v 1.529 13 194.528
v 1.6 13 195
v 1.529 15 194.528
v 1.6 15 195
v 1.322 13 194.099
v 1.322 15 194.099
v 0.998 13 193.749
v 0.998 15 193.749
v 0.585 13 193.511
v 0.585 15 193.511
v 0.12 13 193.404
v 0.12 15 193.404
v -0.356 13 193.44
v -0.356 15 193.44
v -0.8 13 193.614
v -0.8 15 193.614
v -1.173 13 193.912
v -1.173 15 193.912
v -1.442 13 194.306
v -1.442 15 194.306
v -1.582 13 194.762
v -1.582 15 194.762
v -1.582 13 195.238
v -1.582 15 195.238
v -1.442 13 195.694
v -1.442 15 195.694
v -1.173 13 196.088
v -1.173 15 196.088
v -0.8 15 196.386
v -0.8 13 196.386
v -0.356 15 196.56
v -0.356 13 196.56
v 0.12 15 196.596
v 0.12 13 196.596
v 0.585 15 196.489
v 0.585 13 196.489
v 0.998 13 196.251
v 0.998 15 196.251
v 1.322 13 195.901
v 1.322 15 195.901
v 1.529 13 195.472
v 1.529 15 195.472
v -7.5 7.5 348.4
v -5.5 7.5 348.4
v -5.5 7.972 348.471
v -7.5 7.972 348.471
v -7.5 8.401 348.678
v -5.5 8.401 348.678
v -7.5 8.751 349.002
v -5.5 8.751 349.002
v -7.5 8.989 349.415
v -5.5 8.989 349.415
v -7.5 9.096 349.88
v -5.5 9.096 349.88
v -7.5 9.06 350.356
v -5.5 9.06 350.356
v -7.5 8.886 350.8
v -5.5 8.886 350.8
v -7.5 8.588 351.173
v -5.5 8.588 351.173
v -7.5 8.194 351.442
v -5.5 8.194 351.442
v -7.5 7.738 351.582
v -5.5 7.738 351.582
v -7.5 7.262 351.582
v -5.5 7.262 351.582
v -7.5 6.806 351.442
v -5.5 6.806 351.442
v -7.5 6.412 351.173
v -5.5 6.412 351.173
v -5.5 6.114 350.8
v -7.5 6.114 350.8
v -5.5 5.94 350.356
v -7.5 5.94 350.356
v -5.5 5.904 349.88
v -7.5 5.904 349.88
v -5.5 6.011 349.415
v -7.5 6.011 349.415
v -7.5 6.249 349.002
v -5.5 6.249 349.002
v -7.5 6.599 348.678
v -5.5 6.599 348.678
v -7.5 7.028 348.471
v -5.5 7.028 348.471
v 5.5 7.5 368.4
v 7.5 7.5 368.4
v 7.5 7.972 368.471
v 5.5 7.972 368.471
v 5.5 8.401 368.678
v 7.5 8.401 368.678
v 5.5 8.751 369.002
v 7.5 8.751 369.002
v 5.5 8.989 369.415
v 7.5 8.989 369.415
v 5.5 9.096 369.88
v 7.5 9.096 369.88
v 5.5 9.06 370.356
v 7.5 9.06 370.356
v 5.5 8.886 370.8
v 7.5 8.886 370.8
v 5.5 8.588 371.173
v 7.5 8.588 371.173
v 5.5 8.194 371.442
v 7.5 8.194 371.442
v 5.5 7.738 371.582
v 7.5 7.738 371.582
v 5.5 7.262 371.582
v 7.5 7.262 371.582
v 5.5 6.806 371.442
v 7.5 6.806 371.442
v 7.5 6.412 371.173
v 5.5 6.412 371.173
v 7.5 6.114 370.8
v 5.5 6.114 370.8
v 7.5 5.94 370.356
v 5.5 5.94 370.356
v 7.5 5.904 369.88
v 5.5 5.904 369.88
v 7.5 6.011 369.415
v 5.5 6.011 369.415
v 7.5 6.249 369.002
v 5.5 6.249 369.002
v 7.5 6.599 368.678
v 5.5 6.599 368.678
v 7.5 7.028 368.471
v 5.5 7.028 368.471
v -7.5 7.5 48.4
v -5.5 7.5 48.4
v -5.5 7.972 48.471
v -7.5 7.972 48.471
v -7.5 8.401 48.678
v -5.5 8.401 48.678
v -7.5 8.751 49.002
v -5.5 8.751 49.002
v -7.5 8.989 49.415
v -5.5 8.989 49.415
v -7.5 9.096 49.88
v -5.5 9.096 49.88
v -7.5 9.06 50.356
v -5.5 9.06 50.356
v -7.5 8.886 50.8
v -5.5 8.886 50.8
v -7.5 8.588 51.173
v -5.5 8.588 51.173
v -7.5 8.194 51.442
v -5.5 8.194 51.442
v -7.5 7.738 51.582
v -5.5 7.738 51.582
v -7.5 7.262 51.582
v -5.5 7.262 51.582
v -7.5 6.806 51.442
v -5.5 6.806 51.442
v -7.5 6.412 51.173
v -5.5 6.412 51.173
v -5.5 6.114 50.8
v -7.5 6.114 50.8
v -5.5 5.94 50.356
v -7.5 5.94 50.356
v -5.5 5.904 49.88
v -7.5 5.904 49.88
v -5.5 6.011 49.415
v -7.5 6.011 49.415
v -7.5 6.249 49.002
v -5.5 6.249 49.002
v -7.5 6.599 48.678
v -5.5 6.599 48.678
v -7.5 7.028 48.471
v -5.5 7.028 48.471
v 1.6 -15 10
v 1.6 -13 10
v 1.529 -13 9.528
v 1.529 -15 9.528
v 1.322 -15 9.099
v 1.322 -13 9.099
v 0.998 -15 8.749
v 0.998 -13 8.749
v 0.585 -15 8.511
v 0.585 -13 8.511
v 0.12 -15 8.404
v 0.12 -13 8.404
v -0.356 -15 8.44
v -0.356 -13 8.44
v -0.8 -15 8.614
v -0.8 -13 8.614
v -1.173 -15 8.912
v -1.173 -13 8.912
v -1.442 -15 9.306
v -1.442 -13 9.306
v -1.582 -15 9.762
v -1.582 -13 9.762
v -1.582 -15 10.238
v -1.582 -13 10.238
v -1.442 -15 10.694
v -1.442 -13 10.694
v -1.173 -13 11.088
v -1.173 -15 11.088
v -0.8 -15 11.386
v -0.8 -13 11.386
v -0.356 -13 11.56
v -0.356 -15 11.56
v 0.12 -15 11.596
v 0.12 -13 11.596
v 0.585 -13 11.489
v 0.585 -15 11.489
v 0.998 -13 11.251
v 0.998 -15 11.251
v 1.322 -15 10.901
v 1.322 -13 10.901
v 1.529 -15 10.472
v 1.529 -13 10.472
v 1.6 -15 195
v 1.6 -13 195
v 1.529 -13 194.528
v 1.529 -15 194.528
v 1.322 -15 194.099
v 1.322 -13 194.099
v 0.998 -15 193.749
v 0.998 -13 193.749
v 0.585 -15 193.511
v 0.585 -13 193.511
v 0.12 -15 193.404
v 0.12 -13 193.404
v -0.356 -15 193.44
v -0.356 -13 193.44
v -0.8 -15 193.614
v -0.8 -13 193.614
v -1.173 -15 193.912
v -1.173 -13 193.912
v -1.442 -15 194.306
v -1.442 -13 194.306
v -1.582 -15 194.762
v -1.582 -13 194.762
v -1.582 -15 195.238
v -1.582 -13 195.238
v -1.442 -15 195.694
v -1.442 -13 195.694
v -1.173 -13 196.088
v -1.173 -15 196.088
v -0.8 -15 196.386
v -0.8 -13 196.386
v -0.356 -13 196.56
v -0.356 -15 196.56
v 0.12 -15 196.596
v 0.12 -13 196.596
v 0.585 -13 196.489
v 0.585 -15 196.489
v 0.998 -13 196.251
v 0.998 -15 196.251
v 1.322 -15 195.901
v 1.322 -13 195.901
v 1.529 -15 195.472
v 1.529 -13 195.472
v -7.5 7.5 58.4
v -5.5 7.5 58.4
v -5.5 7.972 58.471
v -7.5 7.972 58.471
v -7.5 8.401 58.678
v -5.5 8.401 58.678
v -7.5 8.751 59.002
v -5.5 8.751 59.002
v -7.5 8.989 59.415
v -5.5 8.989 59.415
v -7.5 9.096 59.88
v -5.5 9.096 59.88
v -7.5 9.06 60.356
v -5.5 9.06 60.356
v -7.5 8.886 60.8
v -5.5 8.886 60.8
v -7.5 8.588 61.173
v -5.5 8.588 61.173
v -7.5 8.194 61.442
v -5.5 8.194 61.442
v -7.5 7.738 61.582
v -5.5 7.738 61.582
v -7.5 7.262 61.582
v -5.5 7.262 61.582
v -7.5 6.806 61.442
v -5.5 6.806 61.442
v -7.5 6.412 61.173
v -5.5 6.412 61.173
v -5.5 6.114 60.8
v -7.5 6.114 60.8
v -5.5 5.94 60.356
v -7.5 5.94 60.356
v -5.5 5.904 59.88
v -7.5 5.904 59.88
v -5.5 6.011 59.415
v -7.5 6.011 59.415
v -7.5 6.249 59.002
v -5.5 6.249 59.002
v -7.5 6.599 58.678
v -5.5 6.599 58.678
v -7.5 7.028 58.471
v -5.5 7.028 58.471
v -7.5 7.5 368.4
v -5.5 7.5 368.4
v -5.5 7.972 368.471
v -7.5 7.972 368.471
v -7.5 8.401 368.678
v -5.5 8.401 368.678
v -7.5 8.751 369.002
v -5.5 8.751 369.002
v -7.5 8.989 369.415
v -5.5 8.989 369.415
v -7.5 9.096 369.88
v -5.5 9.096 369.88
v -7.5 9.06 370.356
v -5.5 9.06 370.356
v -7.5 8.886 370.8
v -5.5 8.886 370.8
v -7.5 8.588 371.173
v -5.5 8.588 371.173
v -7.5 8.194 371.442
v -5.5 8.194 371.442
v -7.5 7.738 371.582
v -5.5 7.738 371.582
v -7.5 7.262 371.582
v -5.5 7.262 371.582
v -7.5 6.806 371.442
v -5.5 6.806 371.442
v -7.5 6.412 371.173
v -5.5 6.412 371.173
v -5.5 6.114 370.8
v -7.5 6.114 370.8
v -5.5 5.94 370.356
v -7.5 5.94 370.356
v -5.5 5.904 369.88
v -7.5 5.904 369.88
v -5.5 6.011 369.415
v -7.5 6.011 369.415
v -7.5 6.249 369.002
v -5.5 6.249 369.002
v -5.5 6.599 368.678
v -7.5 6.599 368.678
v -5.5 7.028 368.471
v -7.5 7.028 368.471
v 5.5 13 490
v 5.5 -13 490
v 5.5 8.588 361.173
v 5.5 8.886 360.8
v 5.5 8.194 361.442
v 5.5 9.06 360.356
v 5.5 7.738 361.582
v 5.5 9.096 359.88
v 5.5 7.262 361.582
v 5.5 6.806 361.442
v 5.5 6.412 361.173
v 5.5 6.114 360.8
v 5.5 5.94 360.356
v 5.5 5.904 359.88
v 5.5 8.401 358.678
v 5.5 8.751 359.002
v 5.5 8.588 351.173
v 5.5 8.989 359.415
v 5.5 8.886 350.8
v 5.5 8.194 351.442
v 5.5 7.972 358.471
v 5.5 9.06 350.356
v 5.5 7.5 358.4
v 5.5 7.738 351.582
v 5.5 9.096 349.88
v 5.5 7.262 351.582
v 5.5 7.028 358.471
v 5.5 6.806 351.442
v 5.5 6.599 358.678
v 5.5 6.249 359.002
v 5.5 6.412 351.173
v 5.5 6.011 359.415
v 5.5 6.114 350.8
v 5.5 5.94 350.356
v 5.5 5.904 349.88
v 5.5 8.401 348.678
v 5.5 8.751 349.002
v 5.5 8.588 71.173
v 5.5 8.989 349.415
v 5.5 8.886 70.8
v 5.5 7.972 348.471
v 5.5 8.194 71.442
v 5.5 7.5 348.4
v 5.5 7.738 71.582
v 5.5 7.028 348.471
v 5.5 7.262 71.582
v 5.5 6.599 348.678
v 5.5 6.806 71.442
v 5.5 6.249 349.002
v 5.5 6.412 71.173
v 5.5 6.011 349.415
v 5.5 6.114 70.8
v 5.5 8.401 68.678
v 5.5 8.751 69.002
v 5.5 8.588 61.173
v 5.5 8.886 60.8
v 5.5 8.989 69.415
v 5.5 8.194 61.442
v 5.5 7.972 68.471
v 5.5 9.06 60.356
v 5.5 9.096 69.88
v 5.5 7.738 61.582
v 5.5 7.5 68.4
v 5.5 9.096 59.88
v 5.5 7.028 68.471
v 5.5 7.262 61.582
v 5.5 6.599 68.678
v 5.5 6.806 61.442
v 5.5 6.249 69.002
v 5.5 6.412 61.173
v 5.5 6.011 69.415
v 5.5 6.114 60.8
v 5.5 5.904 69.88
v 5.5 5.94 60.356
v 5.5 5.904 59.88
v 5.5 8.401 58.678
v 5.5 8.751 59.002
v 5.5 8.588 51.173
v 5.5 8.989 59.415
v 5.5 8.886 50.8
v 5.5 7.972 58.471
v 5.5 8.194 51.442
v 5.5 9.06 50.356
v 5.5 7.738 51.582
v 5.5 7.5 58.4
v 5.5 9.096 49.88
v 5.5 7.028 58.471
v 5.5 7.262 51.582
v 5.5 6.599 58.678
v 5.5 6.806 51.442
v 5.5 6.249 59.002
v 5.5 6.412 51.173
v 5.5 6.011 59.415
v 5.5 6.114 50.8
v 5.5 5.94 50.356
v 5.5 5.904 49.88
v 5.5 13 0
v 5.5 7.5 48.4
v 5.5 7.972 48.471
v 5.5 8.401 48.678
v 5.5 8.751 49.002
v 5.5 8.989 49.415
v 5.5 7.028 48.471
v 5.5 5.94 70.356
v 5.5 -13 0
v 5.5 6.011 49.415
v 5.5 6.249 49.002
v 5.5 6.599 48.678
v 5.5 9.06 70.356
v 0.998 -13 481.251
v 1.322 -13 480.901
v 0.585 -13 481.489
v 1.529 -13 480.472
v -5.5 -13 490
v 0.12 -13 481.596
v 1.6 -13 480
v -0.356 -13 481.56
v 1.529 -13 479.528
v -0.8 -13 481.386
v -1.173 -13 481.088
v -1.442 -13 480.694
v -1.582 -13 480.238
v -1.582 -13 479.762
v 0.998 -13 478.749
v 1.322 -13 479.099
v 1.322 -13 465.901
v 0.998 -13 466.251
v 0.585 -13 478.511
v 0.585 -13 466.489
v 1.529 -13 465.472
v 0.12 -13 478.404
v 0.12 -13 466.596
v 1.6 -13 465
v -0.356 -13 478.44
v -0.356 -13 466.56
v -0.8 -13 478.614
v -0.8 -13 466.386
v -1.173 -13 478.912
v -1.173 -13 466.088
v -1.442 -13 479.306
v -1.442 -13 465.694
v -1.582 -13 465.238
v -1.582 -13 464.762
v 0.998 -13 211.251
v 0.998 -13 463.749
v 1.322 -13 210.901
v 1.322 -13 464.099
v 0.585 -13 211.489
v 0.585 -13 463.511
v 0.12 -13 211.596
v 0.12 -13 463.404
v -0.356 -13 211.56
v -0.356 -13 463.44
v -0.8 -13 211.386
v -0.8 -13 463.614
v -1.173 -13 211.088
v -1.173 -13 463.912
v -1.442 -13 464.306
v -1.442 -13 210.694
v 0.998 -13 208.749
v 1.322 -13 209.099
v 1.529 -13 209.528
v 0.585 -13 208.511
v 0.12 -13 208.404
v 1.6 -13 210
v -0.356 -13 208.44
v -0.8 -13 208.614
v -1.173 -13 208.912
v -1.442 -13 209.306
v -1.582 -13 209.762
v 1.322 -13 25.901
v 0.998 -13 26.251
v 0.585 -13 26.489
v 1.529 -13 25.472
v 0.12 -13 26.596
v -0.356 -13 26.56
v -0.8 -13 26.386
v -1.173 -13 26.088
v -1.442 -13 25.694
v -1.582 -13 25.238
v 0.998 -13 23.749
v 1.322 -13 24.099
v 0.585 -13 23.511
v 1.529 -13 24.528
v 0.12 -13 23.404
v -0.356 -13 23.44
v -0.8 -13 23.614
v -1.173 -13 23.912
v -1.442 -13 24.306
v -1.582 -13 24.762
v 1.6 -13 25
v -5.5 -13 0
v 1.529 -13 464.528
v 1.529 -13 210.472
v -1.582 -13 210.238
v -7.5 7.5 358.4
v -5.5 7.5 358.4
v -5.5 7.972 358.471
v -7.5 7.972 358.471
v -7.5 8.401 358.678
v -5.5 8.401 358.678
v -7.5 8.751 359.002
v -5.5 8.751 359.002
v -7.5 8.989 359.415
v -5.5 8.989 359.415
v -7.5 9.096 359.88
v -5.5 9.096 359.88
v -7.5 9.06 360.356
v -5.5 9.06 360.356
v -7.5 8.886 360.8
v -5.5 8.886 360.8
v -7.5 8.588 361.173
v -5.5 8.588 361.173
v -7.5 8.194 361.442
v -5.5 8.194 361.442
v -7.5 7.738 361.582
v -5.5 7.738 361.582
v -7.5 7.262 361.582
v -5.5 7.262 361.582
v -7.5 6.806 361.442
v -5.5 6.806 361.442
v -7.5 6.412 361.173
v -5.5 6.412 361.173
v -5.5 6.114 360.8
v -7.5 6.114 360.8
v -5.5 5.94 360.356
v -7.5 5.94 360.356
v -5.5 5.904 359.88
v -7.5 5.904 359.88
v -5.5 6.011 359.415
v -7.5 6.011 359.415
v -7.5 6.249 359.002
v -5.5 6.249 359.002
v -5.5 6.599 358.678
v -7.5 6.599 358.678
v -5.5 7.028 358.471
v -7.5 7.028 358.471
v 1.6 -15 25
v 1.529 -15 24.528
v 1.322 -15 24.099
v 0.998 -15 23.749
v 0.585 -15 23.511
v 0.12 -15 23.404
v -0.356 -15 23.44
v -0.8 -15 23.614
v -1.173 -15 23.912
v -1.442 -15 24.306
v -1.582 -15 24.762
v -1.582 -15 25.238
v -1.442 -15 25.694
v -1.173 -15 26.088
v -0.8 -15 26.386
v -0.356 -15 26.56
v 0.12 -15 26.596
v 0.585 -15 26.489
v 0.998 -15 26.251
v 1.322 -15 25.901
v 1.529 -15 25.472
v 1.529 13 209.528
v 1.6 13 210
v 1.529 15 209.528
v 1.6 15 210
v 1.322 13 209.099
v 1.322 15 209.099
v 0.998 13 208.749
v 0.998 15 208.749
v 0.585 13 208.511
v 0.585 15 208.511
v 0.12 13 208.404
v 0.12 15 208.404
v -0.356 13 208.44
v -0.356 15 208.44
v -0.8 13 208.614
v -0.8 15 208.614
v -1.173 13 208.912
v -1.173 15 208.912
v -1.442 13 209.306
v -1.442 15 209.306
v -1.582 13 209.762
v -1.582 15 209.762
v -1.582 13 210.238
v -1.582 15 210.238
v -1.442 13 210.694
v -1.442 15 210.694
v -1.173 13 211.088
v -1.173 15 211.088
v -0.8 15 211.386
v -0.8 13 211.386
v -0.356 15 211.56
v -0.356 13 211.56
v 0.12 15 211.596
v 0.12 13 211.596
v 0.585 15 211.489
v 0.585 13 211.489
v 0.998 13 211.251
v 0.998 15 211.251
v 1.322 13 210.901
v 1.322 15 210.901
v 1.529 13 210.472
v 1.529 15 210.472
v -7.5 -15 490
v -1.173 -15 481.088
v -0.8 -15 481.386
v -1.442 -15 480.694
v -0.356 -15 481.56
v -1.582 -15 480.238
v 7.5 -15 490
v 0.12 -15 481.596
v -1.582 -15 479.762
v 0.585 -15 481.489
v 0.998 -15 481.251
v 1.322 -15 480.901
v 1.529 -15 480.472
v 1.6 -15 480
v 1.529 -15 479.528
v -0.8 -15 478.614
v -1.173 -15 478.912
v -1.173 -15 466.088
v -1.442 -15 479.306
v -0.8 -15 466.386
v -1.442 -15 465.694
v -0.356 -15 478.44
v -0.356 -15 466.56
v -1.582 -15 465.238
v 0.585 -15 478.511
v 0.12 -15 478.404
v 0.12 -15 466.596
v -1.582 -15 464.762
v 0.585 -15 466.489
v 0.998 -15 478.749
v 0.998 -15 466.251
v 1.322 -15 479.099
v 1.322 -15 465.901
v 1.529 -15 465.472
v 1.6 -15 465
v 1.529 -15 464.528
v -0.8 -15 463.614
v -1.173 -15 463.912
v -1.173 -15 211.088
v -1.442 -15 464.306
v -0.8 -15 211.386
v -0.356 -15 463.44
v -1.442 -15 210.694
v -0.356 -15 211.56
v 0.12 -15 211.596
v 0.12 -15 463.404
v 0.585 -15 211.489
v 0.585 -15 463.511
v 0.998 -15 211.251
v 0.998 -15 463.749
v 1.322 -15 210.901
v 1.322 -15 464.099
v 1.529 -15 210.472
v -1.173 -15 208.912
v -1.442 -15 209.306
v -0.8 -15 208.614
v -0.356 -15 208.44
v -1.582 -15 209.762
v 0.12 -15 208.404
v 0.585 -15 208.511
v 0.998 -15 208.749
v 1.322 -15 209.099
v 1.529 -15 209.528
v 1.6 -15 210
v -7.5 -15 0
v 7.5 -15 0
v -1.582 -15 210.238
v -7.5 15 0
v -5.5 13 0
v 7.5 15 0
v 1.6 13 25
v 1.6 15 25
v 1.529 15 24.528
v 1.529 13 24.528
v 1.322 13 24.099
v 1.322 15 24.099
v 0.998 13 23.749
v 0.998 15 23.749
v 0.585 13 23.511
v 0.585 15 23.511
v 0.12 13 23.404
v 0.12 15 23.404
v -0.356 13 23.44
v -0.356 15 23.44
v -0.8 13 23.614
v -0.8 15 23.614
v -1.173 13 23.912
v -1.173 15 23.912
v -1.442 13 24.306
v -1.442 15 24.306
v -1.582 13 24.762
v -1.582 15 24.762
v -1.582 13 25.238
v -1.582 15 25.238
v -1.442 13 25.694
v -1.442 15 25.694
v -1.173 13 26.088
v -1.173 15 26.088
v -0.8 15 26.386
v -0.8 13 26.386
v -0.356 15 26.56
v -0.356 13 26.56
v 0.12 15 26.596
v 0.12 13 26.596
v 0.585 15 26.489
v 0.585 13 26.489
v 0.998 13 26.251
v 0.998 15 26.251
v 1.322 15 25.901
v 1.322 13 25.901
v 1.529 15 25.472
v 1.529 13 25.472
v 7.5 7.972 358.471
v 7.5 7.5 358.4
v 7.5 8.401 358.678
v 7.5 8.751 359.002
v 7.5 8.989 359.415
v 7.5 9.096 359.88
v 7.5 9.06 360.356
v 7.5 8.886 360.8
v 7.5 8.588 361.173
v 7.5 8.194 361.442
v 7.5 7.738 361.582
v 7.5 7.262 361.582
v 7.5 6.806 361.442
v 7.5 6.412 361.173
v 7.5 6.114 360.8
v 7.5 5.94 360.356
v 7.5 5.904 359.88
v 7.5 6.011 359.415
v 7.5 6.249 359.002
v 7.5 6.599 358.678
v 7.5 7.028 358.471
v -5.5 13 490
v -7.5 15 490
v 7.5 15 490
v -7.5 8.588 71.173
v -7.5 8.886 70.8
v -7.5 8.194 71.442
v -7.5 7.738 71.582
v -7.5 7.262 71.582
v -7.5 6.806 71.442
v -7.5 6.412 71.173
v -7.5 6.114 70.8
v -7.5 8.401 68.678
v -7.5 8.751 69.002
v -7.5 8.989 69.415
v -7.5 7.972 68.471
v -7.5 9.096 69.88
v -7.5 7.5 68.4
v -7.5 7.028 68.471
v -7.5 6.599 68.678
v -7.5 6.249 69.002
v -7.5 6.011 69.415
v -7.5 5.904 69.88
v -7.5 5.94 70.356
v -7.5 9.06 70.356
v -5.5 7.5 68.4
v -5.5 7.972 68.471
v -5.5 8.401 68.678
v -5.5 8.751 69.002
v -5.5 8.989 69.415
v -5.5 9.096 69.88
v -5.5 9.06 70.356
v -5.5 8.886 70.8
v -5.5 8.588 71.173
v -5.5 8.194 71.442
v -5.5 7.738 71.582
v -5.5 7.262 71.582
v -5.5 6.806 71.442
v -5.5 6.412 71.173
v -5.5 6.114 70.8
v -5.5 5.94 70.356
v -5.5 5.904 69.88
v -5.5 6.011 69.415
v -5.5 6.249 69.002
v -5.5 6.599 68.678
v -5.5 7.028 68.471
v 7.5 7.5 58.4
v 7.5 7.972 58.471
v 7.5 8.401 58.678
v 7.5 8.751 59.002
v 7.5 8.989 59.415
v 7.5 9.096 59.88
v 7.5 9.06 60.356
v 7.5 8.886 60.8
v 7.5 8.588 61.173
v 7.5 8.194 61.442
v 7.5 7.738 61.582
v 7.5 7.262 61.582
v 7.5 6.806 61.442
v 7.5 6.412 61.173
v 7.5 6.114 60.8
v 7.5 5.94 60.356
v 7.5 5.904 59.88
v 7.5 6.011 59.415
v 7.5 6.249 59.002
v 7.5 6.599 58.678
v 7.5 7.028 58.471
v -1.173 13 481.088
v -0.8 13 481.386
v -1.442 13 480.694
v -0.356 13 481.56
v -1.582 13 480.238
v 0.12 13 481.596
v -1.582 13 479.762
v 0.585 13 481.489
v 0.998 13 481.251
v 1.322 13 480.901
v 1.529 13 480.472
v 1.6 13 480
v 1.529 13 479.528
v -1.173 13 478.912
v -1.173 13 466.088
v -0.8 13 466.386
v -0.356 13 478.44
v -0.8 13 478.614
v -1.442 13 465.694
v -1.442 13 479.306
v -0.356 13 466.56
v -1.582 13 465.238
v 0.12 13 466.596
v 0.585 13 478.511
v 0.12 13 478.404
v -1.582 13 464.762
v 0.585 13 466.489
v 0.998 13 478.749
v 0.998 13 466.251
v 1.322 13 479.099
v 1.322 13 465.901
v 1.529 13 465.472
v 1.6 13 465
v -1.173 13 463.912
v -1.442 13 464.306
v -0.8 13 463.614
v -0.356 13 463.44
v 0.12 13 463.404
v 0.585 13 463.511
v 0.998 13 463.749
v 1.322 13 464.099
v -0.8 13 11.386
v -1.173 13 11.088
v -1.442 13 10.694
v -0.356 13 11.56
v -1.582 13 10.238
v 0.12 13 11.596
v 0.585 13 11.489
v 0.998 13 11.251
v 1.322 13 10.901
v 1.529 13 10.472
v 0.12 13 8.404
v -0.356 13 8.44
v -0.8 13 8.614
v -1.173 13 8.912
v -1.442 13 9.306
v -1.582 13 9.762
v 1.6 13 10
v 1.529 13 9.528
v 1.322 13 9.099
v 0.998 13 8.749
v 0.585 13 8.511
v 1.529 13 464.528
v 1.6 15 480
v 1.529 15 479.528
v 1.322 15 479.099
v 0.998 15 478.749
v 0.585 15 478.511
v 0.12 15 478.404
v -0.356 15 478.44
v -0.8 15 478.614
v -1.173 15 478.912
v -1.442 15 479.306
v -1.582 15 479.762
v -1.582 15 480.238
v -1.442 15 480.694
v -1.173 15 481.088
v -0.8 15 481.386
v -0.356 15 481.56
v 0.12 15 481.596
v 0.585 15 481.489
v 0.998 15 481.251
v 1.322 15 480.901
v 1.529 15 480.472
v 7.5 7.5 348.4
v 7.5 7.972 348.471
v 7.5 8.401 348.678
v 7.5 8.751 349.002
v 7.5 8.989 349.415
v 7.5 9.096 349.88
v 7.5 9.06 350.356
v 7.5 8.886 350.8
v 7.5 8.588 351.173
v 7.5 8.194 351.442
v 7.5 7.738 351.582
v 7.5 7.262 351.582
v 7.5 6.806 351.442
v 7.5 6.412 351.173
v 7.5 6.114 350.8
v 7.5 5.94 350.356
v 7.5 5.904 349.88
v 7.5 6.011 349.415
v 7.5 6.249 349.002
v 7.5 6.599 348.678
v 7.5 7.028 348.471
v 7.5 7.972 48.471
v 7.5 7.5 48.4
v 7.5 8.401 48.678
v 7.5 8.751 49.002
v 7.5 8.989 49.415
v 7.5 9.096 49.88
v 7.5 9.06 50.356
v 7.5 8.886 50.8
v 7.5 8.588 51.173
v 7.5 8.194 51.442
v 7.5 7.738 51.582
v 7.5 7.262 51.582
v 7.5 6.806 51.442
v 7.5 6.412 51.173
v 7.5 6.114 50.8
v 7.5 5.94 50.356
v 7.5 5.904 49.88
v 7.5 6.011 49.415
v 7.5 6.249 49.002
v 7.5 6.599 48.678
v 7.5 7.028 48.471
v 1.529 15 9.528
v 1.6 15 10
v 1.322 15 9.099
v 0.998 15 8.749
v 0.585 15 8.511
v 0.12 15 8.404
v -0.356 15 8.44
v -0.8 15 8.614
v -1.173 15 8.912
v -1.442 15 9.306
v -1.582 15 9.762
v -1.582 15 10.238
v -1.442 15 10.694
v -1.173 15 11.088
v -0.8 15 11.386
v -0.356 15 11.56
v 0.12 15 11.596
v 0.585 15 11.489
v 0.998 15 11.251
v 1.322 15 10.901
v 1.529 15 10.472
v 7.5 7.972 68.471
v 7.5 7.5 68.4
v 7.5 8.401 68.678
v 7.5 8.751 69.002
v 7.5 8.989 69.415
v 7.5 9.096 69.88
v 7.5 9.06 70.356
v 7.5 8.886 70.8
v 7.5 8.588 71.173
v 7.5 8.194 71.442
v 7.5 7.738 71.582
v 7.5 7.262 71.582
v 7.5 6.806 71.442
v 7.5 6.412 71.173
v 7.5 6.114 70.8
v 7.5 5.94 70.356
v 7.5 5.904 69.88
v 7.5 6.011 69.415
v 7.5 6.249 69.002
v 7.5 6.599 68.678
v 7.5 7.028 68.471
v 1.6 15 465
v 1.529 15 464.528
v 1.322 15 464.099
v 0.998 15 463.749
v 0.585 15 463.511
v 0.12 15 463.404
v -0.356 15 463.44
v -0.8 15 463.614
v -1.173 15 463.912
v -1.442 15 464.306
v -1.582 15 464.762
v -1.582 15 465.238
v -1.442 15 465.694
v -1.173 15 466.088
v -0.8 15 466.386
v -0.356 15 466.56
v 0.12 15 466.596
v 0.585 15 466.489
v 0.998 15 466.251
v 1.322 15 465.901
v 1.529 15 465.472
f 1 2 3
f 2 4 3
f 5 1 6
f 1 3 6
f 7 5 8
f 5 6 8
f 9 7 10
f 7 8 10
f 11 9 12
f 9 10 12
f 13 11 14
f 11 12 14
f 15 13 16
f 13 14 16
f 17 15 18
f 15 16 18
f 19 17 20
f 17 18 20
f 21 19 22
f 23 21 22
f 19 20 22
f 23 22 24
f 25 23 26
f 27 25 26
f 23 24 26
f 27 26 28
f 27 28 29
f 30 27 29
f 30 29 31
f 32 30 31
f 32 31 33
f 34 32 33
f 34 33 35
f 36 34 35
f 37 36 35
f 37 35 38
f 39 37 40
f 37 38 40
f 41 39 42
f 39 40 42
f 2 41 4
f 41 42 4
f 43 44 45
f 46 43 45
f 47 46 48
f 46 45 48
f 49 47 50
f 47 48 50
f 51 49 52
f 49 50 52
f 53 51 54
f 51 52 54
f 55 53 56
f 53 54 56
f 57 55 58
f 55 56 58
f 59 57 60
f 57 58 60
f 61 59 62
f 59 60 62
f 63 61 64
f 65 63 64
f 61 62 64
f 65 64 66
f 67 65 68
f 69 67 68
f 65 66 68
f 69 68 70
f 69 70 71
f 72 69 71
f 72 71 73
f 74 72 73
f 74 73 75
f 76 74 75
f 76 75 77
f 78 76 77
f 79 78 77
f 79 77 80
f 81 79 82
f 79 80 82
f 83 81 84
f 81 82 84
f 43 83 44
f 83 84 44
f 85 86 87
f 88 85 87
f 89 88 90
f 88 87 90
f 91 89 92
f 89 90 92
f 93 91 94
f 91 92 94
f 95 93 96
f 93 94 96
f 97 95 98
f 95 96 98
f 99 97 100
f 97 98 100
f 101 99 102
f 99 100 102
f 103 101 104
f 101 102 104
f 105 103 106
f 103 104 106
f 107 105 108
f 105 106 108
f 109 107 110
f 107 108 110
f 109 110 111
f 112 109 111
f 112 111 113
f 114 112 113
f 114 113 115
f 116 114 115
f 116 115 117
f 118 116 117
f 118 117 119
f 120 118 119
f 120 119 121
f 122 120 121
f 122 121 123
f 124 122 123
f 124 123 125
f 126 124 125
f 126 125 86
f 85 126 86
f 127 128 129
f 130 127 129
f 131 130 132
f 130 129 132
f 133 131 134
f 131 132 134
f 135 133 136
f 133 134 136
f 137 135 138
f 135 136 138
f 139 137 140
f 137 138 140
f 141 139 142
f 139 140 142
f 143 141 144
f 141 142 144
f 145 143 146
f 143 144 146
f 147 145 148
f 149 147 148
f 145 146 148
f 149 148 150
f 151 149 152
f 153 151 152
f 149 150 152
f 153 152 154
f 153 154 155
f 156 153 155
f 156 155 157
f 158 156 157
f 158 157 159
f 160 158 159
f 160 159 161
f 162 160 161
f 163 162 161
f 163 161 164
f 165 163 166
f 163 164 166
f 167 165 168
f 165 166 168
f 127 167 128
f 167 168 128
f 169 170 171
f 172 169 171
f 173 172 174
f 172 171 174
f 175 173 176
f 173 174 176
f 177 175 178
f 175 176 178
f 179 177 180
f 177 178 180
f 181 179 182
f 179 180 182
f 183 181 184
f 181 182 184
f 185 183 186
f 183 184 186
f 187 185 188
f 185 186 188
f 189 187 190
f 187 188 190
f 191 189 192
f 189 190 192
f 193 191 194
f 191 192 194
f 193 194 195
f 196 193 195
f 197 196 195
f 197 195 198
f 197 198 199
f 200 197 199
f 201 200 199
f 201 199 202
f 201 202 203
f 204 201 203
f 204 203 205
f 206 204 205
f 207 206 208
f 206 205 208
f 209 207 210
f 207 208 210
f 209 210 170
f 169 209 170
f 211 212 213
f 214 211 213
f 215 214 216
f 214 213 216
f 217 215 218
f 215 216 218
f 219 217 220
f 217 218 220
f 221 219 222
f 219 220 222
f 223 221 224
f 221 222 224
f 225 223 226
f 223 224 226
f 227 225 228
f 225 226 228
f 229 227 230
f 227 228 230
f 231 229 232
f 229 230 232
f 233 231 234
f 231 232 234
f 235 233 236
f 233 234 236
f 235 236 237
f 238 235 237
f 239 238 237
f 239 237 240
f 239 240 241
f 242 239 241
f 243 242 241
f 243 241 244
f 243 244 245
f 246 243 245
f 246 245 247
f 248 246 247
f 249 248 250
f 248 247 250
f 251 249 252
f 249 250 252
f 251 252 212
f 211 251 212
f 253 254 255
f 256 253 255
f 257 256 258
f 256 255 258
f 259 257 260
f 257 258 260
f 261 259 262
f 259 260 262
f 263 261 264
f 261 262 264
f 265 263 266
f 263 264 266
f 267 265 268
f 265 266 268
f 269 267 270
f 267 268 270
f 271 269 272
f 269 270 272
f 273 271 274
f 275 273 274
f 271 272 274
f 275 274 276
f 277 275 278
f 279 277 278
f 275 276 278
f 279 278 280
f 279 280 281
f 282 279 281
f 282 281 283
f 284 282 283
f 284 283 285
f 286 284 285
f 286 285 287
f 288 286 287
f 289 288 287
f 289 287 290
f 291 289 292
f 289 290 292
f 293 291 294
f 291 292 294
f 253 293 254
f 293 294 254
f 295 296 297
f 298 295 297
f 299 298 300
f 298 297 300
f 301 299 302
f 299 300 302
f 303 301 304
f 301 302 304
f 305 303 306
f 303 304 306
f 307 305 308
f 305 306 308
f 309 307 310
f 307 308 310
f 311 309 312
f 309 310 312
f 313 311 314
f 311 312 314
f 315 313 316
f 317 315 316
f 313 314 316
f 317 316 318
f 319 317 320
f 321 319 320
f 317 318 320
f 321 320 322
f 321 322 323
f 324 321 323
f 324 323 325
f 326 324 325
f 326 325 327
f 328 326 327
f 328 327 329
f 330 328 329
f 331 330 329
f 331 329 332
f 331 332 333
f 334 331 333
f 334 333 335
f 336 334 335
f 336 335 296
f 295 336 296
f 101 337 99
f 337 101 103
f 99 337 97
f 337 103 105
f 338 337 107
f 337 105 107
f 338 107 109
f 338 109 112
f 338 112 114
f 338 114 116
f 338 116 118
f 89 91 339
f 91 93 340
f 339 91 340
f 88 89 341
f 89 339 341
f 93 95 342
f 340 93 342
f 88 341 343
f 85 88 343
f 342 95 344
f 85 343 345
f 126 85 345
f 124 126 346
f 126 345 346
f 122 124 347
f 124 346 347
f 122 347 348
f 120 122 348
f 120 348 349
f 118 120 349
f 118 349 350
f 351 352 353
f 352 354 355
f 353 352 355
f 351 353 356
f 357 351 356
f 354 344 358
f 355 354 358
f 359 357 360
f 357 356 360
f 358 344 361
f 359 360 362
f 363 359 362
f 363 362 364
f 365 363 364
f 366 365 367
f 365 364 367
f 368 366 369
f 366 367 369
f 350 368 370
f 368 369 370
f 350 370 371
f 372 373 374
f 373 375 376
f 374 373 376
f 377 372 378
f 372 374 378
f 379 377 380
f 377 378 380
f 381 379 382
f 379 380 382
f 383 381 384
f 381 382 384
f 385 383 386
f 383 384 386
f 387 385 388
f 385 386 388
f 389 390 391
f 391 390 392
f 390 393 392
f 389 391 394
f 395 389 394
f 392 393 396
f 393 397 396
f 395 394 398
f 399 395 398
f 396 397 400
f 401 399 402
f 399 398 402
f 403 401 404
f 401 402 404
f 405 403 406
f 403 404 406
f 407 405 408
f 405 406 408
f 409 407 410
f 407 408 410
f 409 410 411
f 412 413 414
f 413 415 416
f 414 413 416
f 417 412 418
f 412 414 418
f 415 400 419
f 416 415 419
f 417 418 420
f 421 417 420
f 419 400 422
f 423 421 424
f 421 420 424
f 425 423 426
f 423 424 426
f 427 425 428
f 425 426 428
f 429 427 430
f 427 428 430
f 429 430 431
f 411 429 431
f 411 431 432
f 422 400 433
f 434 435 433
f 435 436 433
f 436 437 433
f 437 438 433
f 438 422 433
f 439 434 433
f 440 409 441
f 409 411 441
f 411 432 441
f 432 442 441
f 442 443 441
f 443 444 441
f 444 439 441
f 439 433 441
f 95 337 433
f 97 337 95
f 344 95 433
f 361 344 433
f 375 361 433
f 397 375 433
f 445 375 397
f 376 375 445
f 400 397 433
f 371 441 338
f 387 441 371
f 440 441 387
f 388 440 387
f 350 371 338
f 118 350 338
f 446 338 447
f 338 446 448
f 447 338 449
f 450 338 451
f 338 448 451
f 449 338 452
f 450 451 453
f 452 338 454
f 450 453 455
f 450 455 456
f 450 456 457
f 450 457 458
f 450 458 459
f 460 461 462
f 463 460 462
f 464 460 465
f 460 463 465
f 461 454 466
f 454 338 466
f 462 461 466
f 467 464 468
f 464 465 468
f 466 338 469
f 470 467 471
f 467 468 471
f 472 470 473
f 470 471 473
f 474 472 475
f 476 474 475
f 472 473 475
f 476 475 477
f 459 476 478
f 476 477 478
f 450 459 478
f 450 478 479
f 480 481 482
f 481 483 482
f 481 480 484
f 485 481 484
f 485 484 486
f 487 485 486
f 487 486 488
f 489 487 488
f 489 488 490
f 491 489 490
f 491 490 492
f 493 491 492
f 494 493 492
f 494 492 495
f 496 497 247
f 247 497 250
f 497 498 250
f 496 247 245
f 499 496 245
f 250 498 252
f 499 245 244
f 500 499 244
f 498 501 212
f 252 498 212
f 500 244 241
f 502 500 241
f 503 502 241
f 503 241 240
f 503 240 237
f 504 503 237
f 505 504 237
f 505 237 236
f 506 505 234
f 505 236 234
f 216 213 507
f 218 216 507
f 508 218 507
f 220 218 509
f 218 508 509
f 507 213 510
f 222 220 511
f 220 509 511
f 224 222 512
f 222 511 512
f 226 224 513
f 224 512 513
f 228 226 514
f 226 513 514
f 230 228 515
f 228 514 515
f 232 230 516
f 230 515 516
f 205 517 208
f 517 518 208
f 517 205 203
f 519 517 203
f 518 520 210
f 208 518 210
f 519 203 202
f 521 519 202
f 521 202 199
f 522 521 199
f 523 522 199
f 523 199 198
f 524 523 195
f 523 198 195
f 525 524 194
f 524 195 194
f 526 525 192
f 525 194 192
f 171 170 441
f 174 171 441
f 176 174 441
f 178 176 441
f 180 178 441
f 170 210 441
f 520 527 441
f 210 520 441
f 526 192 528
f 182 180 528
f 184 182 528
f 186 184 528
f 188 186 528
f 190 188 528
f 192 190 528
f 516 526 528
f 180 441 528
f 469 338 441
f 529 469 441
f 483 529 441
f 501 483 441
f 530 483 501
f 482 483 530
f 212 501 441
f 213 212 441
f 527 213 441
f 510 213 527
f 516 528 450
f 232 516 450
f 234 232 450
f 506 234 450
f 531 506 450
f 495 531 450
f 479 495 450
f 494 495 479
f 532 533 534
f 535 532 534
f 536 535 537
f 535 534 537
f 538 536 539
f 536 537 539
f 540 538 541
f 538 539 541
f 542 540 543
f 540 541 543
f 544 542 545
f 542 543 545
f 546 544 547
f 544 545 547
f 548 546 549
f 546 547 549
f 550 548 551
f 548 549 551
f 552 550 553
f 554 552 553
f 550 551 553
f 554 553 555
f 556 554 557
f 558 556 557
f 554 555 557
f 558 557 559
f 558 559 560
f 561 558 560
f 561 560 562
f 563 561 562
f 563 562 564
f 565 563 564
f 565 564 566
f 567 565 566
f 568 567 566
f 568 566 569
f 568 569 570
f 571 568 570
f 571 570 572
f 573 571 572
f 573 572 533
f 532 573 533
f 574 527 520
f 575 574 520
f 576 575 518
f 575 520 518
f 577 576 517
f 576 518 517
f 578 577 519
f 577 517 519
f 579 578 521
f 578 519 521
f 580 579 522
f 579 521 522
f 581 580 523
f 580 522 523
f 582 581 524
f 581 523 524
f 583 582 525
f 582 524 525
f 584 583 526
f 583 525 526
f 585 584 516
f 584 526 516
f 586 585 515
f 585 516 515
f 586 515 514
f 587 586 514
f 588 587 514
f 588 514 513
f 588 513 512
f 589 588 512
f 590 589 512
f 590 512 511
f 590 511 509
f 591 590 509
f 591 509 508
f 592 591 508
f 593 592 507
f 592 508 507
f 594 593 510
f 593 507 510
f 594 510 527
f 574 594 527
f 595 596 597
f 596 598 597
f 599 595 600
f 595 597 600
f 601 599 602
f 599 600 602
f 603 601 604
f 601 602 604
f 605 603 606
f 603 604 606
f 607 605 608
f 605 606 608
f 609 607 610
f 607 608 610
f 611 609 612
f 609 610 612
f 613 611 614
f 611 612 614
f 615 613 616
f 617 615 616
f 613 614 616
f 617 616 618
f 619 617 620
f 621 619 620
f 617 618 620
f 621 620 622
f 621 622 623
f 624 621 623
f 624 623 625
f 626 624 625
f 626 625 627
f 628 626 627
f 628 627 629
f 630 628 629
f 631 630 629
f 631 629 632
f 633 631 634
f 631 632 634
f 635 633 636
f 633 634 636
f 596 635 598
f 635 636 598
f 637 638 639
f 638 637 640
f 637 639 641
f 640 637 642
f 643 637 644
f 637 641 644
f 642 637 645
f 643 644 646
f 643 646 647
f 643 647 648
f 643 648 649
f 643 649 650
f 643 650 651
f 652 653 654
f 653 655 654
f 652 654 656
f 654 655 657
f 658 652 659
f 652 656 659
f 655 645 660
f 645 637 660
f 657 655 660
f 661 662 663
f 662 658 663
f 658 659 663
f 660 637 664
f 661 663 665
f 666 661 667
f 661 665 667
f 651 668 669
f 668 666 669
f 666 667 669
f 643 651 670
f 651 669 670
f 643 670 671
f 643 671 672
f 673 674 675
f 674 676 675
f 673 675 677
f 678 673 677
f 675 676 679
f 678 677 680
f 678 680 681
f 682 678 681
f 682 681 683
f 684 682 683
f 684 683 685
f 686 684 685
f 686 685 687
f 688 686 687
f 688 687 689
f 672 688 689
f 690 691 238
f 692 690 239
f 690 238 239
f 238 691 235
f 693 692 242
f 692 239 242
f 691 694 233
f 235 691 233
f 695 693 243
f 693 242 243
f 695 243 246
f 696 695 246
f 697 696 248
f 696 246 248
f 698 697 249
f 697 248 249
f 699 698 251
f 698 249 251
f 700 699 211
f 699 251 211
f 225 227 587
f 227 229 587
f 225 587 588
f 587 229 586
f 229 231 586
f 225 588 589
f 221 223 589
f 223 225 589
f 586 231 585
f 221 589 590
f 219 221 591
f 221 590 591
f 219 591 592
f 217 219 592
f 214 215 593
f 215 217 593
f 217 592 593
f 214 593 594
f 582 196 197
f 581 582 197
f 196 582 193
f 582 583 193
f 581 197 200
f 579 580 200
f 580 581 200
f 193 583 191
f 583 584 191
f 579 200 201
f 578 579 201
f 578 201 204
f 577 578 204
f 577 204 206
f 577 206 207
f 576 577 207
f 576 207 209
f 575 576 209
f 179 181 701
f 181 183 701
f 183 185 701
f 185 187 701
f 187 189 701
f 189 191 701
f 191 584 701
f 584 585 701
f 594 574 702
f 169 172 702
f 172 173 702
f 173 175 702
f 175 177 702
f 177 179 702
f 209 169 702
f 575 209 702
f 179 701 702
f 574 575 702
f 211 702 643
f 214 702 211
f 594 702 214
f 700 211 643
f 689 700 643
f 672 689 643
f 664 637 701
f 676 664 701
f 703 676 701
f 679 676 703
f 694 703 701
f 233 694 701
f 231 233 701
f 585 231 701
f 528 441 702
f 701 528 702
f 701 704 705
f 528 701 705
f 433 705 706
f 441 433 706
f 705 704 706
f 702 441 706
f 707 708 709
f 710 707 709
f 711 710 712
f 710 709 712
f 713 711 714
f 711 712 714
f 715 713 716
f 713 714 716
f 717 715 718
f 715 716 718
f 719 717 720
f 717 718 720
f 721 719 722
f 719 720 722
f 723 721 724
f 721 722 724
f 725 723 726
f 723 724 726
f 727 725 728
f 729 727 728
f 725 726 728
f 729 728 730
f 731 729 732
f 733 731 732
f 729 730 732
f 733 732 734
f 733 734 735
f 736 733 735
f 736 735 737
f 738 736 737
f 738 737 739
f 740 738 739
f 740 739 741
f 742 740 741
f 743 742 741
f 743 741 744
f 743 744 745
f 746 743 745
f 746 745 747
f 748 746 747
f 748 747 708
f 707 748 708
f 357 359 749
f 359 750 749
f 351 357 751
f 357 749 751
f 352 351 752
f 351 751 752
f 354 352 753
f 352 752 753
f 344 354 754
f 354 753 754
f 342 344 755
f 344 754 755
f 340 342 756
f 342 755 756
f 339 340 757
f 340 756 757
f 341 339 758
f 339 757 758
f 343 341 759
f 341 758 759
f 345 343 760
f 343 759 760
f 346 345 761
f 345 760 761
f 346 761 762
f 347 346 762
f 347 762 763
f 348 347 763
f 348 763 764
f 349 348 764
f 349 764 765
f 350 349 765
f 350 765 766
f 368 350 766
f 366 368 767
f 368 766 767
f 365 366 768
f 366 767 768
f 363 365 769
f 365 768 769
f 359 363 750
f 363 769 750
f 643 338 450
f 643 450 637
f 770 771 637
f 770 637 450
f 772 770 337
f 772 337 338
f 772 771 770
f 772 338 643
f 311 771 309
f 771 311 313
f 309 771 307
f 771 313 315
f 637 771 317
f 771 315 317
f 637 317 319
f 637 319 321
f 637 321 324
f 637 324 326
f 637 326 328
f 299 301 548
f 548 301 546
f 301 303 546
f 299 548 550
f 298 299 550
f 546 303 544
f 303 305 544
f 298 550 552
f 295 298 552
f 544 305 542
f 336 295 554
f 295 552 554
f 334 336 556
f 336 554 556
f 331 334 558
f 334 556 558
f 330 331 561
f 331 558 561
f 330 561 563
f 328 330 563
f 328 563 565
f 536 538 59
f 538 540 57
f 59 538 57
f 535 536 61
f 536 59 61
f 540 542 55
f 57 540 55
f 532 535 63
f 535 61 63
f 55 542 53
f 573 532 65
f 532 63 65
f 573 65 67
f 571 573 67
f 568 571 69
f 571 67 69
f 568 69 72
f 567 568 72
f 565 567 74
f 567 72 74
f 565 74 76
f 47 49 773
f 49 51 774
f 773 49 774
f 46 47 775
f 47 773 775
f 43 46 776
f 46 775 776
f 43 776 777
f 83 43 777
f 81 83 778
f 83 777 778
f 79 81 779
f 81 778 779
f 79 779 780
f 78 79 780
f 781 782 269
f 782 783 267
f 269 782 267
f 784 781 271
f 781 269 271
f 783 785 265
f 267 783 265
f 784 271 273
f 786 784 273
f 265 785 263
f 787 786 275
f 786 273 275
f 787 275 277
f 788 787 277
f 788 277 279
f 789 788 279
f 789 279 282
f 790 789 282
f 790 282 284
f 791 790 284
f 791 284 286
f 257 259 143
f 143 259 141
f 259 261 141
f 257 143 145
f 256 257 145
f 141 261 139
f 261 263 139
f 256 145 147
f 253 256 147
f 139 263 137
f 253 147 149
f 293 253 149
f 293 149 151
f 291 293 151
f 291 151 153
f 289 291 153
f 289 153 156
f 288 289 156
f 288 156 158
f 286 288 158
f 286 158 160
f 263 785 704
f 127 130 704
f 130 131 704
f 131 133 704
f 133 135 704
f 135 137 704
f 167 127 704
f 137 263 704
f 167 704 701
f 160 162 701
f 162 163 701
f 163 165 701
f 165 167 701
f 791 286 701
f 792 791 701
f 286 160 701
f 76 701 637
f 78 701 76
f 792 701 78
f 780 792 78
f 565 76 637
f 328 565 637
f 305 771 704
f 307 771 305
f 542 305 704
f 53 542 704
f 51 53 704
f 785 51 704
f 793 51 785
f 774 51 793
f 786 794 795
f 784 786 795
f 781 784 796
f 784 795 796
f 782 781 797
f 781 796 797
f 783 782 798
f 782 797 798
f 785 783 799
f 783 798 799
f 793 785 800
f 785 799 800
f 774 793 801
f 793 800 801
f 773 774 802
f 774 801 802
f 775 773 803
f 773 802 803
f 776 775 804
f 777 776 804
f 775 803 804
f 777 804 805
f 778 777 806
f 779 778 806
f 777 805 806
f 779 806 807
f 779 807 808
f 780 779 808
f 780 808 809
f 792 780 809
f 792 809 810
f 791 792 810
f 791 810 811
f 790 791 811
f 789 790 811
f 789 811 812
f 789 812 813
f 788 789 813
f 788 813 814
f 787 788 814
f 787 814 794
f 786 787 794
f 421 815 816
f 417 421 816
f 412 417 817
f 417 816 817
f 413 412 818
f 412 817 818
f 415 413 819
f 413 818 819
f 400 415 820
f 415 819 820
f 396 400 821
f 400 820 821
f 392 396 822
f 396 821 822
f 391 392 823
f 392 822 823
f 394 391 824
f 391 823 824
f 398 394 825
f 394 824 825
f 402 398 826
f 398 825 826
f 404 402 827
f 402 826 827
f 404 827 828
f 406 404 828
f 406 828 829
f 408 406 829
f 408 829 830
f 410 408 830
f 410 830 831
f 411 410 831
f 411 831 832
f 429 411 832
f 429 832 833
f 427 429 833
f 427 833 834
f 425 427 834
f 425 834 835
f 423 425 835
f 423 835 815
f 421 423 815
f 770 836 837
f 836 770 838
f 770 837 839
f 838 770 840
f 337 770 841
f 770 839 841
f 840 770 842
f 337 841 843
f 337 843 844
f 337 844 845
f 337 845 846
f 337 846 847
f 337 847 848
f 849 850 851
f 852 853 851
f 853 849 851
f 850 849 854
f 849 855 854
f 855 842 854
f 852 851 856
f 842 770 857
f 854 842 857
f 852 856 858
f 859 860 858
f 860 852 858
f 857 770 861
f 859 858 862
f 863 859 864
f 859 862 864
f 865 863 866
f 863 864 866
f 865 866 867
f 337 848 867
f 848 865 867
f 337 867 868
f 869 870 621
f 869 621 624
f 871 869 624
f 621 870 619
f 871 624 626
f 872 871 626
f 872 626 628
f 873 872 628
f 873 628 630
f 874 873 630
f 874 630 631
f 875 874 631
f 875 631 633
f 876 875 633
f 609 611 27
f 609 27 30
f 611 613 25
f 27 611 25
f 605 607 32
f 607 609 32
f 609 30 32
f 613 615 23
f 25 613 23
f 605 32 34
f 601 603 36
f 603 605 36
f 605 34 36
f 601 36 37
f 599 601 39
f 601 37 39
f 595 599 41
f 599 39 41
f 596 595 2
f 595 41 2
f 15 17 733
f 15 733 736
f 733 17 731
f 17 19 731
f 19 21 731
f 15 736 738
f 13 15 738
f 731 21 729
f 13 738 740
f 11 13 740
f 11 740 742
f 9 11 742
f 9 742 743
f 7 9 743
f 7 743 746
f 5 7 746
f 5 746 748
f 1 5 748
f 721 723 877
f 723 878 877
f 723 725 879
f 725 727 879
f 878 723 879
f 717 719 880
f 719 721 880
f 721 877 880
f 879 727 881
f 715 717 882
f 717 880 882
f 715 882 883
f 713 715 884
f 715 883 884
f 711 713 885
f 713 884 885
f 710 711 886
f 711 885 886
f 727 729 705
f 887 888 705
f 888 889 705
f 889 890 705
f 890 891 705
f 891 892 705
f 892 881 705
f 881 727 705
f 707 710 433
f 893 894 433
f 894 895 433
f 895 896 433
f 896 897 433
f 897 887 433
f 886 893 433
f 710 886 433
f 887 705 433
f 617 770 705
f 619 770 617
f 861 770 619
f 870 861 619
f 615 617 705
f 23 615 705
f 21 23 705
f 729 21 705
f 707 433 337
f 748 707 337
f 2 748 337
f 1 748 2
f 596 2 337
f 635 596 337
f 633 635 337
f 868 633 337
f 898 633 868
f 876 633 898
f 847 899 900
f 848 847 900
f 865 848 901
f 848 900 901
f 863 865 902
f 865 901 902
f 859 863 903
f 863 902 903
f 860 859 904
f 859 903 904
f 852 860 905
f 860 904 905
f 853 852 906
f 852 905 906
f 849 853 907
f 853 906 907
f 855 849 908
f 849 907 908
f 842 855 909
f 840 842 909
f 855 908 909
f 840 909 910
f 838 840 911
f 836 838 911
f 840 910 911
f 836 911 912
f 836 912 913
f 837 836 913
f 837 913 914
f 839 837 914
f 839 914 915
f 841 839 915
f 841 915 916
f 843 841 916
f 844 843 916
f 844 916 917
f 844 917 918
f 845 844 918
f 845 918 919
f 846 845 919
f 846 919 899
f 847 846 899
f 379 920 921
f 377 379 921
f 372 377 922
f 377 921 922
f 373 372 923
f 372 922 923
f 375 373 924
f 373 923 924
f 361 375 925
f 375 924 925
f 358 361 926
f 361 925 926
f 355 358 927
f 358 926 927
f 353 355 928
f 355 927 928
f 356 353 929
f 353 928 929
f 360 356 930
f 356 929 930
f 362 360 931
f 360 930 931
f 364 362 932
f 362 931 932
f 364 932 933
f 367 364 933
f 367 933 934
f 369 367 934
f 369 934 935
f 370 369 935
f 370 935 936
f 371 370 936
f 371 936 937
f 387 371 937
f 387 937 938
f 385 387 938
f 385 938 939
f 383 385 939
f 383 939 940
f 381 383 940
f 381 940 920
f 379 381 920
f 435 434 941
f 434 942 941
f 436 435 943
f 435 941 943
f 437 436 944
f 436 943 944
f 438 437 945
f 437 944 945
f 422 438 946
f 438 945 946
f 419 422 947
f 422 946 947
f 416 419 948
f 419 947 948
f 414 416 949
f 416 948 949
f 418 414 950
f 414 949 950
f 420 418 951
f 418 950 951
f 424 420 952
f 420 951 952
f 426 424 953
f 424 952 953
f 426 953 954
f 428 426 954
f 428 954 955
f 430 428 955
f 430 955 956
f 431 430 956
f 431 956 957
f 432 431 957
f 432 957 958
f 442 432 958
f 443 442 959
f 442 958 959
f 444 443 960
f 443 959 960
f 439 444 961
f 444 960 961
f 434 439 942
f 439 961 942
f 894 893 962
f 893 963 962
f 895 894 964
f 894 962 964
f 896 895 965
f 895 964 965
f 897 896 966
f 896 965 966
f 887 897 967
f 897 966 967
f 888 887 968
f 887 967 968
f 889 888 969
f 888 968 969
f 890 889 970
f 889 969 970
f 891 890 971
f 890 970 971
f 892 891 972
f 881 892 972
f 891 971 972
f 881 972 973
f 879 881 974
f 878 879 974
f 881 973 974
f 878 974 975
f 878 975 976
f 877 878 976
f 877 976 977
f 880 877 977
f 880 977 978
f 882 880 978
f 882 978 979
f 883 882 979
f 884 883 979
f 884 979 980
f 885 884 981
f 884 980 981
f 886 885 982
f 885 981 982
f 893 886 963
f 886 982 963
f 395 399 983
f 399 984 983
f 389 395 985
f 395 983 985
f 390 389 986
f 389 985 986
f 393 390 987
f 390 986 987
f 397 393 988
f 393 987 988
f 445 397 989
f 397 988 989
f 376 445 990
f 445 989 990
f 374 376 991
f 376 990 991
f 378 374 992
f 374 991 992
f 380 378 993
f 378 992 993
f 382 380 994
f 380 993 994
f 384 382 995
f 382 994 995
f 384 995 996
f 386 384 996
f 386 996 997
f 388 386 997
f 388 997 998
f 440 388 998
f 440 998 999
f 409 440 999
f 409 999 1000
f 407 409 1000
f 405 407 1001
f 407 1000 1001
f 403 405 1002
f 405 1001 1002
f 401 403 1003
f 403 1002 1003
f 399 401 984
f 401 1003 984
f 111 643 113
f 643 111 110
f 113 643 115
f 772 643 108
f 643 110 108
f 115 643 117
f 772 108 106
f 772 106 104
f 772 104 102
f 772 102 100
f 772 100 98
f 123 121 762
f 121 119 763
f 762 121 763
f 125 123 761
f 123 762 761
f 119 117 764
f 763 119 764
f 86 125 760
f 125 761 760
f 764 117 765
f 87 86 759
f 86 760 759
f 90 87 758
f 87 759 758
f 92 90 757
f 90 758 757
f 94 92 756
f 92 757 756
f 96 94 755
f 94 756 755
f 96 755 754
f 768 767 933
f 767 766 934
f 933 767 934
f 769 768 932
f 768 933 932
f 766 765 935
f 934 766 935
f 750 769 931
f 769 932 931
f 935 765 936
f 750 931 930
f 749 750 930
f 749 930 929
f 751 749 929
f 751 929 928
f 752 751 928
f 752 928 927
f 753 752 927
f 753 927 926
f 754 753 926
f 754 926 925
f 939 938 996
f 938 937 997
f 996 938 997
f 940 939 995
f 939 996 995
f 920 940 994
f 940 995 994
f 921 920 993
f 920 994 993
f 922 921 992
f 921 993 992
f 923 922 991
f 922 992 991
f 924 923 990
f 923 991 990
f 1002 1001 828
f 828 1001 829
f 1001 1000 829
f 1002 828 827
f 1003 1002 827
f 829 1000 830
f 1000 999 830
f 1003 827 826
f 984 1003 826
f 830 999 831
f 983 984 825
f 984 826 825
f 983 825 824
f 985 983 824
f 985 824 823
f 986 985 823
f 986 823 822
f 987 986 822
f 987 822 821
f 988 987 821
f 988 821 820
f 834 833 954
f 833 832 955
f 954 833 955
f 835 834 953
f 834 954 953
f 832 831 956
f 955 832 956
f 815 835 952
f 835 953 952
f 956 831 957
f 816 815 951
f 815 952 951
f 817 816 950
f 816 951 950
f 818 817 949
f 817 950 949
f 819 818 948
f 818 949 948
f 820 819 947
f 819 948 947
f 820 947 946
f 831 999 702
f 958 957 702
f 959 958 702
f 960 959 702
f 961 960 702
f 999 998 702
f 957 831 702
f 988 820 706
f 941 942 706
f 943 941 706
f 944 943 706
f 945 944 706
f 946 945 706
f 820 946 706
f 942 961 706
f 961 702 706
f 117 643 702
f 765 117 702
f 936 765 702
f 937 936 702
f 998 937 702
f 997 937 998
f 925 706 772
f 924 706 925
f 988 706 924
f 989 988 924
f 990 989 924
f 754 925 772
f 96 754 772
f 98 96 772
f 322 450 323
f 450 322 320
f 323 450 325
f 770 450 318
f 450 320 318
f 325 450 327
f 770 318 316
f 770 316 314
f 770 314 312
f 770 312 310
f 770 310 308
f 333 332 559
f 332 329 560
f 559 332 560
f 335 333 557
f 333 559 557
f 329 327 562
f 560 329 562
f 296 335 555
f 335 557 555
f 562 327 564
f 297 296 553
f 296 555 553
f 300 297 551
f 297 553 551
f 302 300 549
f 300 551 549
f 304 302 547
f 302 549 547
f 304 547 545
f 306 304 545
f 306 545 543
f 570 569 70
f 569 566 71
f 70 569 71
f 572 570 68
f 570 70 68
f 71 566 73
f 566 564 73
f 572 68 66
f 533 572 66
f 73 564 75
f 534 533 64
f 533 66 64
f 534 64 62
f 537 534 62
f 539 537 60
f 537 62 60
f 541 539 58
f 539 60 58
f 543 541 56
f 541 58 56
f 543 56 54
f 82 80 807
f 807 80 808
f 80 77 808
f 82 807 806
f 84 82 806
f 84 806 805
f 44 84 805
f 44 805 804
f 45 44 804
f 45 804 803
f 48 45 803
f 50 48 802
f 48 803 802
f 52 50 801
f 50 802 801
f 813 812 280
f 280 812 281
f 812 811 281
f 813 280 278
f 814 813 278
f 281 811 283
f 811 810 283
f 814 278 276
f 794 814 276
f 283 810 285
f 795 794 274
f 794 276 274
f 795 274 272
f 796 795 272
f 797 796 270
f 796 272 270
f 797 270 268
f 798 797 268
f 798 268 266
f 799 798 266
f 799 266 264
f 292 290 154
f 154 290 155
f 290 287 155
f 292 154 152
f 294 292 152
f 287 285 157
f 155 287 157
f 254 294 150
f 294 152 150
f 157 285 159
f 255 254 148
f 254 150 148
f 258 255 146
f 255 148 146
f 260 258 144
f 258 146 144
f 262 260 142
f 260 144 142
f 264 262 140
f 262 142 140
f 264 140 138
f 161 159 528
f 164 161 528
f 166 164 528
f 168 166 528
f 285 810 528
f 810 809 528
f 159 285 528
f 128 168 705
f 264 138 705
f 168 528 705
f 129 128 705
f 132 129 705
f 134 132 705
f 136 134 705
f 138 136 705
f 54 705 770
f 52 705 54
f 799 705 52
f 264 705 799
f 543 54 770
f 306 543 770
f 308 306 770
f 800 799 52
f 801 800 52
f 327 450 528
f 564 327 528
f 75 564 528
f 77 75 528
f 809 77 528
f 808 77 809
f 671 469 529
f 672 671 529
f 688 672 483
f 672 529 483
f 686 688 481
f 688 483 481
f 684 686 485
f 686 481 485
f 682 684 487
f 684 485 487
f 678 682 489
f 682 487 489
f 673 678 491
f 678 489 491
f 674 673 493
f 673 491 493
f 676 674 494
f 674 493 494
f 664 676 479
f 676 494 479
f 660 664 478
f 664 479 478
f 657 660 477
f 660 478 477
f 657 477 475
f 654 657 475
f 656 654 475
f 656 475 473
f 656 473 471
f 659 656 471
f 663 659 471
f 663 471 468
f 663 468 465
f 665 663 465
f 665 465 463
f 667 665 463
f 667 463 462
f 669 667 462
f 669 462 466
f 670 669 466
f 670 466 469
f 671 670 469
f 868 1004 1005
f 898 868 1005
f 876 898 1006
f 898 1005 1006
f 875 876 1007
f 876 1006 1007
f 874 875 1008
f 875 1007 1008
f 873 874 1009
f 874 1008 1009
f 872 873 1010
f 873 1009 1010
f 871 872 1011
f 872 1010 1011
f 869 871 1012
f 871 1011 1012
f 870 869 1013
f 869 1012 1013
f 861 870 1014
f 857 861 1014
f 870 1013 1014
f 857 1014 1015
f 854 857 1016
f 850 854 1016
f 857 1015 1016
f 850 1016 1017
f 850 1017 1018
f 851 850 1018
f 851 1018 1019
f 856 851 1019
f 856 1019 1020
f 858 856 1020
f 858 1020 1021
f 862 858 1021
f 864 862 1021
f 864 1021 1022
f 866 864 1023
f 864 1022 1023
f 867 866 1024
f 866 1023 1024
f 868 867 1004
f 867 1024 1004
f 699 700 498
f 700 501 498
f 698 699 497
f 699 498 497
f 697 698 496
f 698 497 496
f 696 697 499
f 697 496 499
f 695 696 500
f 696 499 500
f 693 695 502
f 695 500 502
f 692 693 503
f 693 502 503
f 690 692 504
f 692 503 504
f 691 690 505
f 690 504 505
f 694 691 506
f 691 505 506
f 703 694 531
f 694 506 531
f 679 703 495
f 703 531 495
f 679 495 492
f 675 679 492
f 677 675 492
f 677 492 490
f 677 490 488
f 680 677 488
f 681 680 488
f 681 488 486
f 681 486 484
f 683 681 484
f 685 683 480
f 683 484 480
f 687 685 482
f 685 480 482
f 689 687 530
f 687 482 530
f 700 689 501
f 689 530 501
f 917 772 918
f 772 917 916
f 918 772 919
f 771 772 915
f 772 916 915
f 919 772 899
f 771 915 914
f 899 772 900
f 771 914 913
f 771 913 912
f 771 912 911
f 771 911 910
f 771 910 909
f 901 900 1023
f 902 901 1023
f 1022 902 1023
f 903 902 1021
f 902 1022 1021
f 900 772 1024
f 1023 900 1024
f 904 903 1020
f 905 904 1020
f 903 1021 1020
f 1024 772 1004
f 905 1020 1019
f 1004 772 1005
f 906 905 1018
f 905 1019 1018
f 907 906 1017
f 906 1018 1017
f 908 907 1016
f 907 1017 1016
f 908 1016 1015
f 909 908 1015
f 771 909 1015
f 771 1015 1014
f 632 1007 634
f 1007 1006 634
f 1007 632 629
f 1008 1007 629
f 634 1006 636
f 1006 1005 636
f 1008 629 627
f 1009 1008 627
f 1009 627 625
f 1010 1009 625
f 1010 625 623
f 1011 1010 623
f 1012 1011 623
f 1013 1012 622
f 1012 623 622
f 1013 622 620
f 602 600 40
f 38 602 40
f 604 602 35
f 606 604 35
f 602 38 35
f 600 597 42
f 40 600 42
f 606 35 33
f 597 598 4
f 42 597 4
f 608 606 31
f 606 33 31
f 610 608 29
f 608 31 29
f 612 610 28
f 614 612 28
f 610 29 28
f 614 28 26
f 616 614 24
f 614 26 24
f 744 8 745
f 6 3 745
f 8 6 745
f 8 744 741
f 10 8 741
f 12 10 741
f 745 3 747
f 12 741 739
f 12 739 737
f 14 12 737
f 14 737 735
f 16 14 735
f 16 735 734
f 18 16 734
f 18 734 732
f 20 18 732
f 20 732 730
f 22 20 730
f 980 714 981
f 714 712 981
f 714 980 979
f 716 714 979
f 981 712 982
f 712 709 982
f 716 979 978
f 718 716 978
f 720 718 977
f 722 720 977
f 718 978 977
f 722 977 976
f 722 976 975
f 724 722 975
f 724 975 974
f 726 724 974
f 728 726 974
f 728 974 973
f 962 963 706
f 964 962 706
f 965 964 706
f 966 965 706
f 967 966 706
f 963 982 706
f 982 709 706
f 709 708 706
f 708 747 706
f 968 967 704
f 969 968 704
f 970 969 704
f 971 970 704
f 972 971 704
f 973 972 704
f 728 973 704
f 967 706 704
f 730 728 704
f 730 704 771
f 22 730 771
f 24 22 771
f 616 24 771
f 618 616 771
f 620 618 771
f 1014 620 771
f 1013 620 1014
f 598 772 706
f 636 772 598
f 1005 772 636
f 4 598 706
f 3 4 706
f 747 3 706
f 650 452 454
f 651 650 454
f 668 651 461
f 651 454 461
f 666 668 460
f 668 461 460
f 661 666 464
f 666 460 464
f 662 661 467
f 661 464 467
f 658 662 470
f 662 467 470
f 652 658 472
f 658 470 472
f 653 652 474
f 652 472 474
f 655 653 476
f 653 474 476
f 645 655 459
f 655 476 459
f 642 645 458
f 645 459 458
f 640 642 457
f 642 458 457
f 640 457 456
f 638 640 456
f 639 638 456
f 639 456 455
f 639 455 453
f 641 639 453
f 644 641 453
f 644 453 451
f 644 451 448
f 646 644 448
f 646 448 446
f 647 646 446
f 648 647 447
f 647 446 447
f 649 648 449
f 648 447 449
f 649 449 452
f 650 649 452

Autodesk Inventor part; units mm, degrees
ref_plane "YZ Plane" through (0, 0, 0) normal (1, 0, 0) x (0, 1, 0)
ref_plane "XZ Plane" through (0, 0, 0) normal (0, 1, 0) x (-1, 0, 0)
ref_plane "XY Plane" through (0, 0, 0) normal (0, 0, 1) x (1, 0, 0)
sketch "スケッチ1" plane through (0, 0, 0) normal (0, 0, 1) x (1, 0, 0)
  line L0 (7.5, 15) -> (-7.5, 15)
  line L1 (-7.5, 15) -> (-7.5, -15)
  line L2 (-7.5, -15) -> (7.5, -15)
  line L3 (7.5, -15) -> (7.5, 15)
  line L4 (7.5, 15) -> (-7.5, -15) construction
  line L5 (-7.5, 15) -> (7.5, -15) construction
  line L6 (-5.5, 13) -> (5.5, 13)
  line L7 (5.5, 13) -> (5.5, -13)
  line L8 (5.5, -13) -> (-5.5, -13)
  line L9 (-5.5, -13) -> (-5.5, 13)
  point P0 (0, 0)
  dimension "d0" = 15
  dimension "d1" = 30
  dimension "d2" = 2
extrude "押し出し1" add sketch "スケッチ1" along normal blind 490
sketch "スケッチ2" plane through (-7.5, 15, 0) normal (0, 1, 0) x (1, 0, 0)
  circle A0 centre (7.5, -10) radius 1.6
  circle A1 centre (7.5, -25) radius 1.6
  circle A2 centre (7.5, -480) radius 1.6
  circle A3 centre (7.5, -465) radius 1.6
  line L0 (15, 0) -> (0, 0) projected
  line L1 (15, -490) -> (0, -490) projected
  circle A4 centre (7.5, -195) radius 1.6
  circle A5 centre (7.5, -210) radius 1.6
  point P0 (7.5, 0)
  point P1 (7.5, 0)
  dimension "d5" = 3.2
  dimension "d6" = 3.2
  dimension "d7" = 3.2
  dimension "d8" = 3.2
  dimension "d9" = 10
  dimension "d10" = 15
  dimension "d11" = 10
  dimension "d12" = 15
  dimension "d15" = 3.2
  dimension "d16" = 3.2
  dimension "d17" = 15
  dimension "d18" = 170
extrude "押し出し2" cut sketch "スケッチ2" against normal through all
sketch "スケッチ3" plane through (7.5, -15, 0) normal (1, 0, 0) x (0, 0, -1)
  circle A0 centre (-50, 22.5) radius 1.6
  circle A1 centre (-60, 22.5) radius 1.6
  circle A2 centre (-70, 22.5) radius 1.6
  line L0 (0, 30) -> (-490, 30) projected
  circle A3 centre (-350, 22.5) radius 1.6
  circle A4 centre (-360, 22.5) radius 1.6
  circle A5 centre (-370, 22.5) radius 1.6
  point P0 (0, 15)
  dimension "d19" = 3.2
  dimension "d20" = 3.2
  dimension "d21" = 3.2
  dimension "d22" = 7.5
  dimension "d23" = 50
  dimension "d24" = 10
  dimension "d25" = 10
  dimension "d26" = 3.2
  dimension "d27" = 3.2
  dimension "d28" = 3.2
  dimension "d29" = 10
  dimension "d30" = 10
  dimension "d31" = 300
extrude "押し出し3" cut sketch "スケッチ3" against normal through all
properties part number "オムニ_角柱3" material "アルミニウム 6061"
